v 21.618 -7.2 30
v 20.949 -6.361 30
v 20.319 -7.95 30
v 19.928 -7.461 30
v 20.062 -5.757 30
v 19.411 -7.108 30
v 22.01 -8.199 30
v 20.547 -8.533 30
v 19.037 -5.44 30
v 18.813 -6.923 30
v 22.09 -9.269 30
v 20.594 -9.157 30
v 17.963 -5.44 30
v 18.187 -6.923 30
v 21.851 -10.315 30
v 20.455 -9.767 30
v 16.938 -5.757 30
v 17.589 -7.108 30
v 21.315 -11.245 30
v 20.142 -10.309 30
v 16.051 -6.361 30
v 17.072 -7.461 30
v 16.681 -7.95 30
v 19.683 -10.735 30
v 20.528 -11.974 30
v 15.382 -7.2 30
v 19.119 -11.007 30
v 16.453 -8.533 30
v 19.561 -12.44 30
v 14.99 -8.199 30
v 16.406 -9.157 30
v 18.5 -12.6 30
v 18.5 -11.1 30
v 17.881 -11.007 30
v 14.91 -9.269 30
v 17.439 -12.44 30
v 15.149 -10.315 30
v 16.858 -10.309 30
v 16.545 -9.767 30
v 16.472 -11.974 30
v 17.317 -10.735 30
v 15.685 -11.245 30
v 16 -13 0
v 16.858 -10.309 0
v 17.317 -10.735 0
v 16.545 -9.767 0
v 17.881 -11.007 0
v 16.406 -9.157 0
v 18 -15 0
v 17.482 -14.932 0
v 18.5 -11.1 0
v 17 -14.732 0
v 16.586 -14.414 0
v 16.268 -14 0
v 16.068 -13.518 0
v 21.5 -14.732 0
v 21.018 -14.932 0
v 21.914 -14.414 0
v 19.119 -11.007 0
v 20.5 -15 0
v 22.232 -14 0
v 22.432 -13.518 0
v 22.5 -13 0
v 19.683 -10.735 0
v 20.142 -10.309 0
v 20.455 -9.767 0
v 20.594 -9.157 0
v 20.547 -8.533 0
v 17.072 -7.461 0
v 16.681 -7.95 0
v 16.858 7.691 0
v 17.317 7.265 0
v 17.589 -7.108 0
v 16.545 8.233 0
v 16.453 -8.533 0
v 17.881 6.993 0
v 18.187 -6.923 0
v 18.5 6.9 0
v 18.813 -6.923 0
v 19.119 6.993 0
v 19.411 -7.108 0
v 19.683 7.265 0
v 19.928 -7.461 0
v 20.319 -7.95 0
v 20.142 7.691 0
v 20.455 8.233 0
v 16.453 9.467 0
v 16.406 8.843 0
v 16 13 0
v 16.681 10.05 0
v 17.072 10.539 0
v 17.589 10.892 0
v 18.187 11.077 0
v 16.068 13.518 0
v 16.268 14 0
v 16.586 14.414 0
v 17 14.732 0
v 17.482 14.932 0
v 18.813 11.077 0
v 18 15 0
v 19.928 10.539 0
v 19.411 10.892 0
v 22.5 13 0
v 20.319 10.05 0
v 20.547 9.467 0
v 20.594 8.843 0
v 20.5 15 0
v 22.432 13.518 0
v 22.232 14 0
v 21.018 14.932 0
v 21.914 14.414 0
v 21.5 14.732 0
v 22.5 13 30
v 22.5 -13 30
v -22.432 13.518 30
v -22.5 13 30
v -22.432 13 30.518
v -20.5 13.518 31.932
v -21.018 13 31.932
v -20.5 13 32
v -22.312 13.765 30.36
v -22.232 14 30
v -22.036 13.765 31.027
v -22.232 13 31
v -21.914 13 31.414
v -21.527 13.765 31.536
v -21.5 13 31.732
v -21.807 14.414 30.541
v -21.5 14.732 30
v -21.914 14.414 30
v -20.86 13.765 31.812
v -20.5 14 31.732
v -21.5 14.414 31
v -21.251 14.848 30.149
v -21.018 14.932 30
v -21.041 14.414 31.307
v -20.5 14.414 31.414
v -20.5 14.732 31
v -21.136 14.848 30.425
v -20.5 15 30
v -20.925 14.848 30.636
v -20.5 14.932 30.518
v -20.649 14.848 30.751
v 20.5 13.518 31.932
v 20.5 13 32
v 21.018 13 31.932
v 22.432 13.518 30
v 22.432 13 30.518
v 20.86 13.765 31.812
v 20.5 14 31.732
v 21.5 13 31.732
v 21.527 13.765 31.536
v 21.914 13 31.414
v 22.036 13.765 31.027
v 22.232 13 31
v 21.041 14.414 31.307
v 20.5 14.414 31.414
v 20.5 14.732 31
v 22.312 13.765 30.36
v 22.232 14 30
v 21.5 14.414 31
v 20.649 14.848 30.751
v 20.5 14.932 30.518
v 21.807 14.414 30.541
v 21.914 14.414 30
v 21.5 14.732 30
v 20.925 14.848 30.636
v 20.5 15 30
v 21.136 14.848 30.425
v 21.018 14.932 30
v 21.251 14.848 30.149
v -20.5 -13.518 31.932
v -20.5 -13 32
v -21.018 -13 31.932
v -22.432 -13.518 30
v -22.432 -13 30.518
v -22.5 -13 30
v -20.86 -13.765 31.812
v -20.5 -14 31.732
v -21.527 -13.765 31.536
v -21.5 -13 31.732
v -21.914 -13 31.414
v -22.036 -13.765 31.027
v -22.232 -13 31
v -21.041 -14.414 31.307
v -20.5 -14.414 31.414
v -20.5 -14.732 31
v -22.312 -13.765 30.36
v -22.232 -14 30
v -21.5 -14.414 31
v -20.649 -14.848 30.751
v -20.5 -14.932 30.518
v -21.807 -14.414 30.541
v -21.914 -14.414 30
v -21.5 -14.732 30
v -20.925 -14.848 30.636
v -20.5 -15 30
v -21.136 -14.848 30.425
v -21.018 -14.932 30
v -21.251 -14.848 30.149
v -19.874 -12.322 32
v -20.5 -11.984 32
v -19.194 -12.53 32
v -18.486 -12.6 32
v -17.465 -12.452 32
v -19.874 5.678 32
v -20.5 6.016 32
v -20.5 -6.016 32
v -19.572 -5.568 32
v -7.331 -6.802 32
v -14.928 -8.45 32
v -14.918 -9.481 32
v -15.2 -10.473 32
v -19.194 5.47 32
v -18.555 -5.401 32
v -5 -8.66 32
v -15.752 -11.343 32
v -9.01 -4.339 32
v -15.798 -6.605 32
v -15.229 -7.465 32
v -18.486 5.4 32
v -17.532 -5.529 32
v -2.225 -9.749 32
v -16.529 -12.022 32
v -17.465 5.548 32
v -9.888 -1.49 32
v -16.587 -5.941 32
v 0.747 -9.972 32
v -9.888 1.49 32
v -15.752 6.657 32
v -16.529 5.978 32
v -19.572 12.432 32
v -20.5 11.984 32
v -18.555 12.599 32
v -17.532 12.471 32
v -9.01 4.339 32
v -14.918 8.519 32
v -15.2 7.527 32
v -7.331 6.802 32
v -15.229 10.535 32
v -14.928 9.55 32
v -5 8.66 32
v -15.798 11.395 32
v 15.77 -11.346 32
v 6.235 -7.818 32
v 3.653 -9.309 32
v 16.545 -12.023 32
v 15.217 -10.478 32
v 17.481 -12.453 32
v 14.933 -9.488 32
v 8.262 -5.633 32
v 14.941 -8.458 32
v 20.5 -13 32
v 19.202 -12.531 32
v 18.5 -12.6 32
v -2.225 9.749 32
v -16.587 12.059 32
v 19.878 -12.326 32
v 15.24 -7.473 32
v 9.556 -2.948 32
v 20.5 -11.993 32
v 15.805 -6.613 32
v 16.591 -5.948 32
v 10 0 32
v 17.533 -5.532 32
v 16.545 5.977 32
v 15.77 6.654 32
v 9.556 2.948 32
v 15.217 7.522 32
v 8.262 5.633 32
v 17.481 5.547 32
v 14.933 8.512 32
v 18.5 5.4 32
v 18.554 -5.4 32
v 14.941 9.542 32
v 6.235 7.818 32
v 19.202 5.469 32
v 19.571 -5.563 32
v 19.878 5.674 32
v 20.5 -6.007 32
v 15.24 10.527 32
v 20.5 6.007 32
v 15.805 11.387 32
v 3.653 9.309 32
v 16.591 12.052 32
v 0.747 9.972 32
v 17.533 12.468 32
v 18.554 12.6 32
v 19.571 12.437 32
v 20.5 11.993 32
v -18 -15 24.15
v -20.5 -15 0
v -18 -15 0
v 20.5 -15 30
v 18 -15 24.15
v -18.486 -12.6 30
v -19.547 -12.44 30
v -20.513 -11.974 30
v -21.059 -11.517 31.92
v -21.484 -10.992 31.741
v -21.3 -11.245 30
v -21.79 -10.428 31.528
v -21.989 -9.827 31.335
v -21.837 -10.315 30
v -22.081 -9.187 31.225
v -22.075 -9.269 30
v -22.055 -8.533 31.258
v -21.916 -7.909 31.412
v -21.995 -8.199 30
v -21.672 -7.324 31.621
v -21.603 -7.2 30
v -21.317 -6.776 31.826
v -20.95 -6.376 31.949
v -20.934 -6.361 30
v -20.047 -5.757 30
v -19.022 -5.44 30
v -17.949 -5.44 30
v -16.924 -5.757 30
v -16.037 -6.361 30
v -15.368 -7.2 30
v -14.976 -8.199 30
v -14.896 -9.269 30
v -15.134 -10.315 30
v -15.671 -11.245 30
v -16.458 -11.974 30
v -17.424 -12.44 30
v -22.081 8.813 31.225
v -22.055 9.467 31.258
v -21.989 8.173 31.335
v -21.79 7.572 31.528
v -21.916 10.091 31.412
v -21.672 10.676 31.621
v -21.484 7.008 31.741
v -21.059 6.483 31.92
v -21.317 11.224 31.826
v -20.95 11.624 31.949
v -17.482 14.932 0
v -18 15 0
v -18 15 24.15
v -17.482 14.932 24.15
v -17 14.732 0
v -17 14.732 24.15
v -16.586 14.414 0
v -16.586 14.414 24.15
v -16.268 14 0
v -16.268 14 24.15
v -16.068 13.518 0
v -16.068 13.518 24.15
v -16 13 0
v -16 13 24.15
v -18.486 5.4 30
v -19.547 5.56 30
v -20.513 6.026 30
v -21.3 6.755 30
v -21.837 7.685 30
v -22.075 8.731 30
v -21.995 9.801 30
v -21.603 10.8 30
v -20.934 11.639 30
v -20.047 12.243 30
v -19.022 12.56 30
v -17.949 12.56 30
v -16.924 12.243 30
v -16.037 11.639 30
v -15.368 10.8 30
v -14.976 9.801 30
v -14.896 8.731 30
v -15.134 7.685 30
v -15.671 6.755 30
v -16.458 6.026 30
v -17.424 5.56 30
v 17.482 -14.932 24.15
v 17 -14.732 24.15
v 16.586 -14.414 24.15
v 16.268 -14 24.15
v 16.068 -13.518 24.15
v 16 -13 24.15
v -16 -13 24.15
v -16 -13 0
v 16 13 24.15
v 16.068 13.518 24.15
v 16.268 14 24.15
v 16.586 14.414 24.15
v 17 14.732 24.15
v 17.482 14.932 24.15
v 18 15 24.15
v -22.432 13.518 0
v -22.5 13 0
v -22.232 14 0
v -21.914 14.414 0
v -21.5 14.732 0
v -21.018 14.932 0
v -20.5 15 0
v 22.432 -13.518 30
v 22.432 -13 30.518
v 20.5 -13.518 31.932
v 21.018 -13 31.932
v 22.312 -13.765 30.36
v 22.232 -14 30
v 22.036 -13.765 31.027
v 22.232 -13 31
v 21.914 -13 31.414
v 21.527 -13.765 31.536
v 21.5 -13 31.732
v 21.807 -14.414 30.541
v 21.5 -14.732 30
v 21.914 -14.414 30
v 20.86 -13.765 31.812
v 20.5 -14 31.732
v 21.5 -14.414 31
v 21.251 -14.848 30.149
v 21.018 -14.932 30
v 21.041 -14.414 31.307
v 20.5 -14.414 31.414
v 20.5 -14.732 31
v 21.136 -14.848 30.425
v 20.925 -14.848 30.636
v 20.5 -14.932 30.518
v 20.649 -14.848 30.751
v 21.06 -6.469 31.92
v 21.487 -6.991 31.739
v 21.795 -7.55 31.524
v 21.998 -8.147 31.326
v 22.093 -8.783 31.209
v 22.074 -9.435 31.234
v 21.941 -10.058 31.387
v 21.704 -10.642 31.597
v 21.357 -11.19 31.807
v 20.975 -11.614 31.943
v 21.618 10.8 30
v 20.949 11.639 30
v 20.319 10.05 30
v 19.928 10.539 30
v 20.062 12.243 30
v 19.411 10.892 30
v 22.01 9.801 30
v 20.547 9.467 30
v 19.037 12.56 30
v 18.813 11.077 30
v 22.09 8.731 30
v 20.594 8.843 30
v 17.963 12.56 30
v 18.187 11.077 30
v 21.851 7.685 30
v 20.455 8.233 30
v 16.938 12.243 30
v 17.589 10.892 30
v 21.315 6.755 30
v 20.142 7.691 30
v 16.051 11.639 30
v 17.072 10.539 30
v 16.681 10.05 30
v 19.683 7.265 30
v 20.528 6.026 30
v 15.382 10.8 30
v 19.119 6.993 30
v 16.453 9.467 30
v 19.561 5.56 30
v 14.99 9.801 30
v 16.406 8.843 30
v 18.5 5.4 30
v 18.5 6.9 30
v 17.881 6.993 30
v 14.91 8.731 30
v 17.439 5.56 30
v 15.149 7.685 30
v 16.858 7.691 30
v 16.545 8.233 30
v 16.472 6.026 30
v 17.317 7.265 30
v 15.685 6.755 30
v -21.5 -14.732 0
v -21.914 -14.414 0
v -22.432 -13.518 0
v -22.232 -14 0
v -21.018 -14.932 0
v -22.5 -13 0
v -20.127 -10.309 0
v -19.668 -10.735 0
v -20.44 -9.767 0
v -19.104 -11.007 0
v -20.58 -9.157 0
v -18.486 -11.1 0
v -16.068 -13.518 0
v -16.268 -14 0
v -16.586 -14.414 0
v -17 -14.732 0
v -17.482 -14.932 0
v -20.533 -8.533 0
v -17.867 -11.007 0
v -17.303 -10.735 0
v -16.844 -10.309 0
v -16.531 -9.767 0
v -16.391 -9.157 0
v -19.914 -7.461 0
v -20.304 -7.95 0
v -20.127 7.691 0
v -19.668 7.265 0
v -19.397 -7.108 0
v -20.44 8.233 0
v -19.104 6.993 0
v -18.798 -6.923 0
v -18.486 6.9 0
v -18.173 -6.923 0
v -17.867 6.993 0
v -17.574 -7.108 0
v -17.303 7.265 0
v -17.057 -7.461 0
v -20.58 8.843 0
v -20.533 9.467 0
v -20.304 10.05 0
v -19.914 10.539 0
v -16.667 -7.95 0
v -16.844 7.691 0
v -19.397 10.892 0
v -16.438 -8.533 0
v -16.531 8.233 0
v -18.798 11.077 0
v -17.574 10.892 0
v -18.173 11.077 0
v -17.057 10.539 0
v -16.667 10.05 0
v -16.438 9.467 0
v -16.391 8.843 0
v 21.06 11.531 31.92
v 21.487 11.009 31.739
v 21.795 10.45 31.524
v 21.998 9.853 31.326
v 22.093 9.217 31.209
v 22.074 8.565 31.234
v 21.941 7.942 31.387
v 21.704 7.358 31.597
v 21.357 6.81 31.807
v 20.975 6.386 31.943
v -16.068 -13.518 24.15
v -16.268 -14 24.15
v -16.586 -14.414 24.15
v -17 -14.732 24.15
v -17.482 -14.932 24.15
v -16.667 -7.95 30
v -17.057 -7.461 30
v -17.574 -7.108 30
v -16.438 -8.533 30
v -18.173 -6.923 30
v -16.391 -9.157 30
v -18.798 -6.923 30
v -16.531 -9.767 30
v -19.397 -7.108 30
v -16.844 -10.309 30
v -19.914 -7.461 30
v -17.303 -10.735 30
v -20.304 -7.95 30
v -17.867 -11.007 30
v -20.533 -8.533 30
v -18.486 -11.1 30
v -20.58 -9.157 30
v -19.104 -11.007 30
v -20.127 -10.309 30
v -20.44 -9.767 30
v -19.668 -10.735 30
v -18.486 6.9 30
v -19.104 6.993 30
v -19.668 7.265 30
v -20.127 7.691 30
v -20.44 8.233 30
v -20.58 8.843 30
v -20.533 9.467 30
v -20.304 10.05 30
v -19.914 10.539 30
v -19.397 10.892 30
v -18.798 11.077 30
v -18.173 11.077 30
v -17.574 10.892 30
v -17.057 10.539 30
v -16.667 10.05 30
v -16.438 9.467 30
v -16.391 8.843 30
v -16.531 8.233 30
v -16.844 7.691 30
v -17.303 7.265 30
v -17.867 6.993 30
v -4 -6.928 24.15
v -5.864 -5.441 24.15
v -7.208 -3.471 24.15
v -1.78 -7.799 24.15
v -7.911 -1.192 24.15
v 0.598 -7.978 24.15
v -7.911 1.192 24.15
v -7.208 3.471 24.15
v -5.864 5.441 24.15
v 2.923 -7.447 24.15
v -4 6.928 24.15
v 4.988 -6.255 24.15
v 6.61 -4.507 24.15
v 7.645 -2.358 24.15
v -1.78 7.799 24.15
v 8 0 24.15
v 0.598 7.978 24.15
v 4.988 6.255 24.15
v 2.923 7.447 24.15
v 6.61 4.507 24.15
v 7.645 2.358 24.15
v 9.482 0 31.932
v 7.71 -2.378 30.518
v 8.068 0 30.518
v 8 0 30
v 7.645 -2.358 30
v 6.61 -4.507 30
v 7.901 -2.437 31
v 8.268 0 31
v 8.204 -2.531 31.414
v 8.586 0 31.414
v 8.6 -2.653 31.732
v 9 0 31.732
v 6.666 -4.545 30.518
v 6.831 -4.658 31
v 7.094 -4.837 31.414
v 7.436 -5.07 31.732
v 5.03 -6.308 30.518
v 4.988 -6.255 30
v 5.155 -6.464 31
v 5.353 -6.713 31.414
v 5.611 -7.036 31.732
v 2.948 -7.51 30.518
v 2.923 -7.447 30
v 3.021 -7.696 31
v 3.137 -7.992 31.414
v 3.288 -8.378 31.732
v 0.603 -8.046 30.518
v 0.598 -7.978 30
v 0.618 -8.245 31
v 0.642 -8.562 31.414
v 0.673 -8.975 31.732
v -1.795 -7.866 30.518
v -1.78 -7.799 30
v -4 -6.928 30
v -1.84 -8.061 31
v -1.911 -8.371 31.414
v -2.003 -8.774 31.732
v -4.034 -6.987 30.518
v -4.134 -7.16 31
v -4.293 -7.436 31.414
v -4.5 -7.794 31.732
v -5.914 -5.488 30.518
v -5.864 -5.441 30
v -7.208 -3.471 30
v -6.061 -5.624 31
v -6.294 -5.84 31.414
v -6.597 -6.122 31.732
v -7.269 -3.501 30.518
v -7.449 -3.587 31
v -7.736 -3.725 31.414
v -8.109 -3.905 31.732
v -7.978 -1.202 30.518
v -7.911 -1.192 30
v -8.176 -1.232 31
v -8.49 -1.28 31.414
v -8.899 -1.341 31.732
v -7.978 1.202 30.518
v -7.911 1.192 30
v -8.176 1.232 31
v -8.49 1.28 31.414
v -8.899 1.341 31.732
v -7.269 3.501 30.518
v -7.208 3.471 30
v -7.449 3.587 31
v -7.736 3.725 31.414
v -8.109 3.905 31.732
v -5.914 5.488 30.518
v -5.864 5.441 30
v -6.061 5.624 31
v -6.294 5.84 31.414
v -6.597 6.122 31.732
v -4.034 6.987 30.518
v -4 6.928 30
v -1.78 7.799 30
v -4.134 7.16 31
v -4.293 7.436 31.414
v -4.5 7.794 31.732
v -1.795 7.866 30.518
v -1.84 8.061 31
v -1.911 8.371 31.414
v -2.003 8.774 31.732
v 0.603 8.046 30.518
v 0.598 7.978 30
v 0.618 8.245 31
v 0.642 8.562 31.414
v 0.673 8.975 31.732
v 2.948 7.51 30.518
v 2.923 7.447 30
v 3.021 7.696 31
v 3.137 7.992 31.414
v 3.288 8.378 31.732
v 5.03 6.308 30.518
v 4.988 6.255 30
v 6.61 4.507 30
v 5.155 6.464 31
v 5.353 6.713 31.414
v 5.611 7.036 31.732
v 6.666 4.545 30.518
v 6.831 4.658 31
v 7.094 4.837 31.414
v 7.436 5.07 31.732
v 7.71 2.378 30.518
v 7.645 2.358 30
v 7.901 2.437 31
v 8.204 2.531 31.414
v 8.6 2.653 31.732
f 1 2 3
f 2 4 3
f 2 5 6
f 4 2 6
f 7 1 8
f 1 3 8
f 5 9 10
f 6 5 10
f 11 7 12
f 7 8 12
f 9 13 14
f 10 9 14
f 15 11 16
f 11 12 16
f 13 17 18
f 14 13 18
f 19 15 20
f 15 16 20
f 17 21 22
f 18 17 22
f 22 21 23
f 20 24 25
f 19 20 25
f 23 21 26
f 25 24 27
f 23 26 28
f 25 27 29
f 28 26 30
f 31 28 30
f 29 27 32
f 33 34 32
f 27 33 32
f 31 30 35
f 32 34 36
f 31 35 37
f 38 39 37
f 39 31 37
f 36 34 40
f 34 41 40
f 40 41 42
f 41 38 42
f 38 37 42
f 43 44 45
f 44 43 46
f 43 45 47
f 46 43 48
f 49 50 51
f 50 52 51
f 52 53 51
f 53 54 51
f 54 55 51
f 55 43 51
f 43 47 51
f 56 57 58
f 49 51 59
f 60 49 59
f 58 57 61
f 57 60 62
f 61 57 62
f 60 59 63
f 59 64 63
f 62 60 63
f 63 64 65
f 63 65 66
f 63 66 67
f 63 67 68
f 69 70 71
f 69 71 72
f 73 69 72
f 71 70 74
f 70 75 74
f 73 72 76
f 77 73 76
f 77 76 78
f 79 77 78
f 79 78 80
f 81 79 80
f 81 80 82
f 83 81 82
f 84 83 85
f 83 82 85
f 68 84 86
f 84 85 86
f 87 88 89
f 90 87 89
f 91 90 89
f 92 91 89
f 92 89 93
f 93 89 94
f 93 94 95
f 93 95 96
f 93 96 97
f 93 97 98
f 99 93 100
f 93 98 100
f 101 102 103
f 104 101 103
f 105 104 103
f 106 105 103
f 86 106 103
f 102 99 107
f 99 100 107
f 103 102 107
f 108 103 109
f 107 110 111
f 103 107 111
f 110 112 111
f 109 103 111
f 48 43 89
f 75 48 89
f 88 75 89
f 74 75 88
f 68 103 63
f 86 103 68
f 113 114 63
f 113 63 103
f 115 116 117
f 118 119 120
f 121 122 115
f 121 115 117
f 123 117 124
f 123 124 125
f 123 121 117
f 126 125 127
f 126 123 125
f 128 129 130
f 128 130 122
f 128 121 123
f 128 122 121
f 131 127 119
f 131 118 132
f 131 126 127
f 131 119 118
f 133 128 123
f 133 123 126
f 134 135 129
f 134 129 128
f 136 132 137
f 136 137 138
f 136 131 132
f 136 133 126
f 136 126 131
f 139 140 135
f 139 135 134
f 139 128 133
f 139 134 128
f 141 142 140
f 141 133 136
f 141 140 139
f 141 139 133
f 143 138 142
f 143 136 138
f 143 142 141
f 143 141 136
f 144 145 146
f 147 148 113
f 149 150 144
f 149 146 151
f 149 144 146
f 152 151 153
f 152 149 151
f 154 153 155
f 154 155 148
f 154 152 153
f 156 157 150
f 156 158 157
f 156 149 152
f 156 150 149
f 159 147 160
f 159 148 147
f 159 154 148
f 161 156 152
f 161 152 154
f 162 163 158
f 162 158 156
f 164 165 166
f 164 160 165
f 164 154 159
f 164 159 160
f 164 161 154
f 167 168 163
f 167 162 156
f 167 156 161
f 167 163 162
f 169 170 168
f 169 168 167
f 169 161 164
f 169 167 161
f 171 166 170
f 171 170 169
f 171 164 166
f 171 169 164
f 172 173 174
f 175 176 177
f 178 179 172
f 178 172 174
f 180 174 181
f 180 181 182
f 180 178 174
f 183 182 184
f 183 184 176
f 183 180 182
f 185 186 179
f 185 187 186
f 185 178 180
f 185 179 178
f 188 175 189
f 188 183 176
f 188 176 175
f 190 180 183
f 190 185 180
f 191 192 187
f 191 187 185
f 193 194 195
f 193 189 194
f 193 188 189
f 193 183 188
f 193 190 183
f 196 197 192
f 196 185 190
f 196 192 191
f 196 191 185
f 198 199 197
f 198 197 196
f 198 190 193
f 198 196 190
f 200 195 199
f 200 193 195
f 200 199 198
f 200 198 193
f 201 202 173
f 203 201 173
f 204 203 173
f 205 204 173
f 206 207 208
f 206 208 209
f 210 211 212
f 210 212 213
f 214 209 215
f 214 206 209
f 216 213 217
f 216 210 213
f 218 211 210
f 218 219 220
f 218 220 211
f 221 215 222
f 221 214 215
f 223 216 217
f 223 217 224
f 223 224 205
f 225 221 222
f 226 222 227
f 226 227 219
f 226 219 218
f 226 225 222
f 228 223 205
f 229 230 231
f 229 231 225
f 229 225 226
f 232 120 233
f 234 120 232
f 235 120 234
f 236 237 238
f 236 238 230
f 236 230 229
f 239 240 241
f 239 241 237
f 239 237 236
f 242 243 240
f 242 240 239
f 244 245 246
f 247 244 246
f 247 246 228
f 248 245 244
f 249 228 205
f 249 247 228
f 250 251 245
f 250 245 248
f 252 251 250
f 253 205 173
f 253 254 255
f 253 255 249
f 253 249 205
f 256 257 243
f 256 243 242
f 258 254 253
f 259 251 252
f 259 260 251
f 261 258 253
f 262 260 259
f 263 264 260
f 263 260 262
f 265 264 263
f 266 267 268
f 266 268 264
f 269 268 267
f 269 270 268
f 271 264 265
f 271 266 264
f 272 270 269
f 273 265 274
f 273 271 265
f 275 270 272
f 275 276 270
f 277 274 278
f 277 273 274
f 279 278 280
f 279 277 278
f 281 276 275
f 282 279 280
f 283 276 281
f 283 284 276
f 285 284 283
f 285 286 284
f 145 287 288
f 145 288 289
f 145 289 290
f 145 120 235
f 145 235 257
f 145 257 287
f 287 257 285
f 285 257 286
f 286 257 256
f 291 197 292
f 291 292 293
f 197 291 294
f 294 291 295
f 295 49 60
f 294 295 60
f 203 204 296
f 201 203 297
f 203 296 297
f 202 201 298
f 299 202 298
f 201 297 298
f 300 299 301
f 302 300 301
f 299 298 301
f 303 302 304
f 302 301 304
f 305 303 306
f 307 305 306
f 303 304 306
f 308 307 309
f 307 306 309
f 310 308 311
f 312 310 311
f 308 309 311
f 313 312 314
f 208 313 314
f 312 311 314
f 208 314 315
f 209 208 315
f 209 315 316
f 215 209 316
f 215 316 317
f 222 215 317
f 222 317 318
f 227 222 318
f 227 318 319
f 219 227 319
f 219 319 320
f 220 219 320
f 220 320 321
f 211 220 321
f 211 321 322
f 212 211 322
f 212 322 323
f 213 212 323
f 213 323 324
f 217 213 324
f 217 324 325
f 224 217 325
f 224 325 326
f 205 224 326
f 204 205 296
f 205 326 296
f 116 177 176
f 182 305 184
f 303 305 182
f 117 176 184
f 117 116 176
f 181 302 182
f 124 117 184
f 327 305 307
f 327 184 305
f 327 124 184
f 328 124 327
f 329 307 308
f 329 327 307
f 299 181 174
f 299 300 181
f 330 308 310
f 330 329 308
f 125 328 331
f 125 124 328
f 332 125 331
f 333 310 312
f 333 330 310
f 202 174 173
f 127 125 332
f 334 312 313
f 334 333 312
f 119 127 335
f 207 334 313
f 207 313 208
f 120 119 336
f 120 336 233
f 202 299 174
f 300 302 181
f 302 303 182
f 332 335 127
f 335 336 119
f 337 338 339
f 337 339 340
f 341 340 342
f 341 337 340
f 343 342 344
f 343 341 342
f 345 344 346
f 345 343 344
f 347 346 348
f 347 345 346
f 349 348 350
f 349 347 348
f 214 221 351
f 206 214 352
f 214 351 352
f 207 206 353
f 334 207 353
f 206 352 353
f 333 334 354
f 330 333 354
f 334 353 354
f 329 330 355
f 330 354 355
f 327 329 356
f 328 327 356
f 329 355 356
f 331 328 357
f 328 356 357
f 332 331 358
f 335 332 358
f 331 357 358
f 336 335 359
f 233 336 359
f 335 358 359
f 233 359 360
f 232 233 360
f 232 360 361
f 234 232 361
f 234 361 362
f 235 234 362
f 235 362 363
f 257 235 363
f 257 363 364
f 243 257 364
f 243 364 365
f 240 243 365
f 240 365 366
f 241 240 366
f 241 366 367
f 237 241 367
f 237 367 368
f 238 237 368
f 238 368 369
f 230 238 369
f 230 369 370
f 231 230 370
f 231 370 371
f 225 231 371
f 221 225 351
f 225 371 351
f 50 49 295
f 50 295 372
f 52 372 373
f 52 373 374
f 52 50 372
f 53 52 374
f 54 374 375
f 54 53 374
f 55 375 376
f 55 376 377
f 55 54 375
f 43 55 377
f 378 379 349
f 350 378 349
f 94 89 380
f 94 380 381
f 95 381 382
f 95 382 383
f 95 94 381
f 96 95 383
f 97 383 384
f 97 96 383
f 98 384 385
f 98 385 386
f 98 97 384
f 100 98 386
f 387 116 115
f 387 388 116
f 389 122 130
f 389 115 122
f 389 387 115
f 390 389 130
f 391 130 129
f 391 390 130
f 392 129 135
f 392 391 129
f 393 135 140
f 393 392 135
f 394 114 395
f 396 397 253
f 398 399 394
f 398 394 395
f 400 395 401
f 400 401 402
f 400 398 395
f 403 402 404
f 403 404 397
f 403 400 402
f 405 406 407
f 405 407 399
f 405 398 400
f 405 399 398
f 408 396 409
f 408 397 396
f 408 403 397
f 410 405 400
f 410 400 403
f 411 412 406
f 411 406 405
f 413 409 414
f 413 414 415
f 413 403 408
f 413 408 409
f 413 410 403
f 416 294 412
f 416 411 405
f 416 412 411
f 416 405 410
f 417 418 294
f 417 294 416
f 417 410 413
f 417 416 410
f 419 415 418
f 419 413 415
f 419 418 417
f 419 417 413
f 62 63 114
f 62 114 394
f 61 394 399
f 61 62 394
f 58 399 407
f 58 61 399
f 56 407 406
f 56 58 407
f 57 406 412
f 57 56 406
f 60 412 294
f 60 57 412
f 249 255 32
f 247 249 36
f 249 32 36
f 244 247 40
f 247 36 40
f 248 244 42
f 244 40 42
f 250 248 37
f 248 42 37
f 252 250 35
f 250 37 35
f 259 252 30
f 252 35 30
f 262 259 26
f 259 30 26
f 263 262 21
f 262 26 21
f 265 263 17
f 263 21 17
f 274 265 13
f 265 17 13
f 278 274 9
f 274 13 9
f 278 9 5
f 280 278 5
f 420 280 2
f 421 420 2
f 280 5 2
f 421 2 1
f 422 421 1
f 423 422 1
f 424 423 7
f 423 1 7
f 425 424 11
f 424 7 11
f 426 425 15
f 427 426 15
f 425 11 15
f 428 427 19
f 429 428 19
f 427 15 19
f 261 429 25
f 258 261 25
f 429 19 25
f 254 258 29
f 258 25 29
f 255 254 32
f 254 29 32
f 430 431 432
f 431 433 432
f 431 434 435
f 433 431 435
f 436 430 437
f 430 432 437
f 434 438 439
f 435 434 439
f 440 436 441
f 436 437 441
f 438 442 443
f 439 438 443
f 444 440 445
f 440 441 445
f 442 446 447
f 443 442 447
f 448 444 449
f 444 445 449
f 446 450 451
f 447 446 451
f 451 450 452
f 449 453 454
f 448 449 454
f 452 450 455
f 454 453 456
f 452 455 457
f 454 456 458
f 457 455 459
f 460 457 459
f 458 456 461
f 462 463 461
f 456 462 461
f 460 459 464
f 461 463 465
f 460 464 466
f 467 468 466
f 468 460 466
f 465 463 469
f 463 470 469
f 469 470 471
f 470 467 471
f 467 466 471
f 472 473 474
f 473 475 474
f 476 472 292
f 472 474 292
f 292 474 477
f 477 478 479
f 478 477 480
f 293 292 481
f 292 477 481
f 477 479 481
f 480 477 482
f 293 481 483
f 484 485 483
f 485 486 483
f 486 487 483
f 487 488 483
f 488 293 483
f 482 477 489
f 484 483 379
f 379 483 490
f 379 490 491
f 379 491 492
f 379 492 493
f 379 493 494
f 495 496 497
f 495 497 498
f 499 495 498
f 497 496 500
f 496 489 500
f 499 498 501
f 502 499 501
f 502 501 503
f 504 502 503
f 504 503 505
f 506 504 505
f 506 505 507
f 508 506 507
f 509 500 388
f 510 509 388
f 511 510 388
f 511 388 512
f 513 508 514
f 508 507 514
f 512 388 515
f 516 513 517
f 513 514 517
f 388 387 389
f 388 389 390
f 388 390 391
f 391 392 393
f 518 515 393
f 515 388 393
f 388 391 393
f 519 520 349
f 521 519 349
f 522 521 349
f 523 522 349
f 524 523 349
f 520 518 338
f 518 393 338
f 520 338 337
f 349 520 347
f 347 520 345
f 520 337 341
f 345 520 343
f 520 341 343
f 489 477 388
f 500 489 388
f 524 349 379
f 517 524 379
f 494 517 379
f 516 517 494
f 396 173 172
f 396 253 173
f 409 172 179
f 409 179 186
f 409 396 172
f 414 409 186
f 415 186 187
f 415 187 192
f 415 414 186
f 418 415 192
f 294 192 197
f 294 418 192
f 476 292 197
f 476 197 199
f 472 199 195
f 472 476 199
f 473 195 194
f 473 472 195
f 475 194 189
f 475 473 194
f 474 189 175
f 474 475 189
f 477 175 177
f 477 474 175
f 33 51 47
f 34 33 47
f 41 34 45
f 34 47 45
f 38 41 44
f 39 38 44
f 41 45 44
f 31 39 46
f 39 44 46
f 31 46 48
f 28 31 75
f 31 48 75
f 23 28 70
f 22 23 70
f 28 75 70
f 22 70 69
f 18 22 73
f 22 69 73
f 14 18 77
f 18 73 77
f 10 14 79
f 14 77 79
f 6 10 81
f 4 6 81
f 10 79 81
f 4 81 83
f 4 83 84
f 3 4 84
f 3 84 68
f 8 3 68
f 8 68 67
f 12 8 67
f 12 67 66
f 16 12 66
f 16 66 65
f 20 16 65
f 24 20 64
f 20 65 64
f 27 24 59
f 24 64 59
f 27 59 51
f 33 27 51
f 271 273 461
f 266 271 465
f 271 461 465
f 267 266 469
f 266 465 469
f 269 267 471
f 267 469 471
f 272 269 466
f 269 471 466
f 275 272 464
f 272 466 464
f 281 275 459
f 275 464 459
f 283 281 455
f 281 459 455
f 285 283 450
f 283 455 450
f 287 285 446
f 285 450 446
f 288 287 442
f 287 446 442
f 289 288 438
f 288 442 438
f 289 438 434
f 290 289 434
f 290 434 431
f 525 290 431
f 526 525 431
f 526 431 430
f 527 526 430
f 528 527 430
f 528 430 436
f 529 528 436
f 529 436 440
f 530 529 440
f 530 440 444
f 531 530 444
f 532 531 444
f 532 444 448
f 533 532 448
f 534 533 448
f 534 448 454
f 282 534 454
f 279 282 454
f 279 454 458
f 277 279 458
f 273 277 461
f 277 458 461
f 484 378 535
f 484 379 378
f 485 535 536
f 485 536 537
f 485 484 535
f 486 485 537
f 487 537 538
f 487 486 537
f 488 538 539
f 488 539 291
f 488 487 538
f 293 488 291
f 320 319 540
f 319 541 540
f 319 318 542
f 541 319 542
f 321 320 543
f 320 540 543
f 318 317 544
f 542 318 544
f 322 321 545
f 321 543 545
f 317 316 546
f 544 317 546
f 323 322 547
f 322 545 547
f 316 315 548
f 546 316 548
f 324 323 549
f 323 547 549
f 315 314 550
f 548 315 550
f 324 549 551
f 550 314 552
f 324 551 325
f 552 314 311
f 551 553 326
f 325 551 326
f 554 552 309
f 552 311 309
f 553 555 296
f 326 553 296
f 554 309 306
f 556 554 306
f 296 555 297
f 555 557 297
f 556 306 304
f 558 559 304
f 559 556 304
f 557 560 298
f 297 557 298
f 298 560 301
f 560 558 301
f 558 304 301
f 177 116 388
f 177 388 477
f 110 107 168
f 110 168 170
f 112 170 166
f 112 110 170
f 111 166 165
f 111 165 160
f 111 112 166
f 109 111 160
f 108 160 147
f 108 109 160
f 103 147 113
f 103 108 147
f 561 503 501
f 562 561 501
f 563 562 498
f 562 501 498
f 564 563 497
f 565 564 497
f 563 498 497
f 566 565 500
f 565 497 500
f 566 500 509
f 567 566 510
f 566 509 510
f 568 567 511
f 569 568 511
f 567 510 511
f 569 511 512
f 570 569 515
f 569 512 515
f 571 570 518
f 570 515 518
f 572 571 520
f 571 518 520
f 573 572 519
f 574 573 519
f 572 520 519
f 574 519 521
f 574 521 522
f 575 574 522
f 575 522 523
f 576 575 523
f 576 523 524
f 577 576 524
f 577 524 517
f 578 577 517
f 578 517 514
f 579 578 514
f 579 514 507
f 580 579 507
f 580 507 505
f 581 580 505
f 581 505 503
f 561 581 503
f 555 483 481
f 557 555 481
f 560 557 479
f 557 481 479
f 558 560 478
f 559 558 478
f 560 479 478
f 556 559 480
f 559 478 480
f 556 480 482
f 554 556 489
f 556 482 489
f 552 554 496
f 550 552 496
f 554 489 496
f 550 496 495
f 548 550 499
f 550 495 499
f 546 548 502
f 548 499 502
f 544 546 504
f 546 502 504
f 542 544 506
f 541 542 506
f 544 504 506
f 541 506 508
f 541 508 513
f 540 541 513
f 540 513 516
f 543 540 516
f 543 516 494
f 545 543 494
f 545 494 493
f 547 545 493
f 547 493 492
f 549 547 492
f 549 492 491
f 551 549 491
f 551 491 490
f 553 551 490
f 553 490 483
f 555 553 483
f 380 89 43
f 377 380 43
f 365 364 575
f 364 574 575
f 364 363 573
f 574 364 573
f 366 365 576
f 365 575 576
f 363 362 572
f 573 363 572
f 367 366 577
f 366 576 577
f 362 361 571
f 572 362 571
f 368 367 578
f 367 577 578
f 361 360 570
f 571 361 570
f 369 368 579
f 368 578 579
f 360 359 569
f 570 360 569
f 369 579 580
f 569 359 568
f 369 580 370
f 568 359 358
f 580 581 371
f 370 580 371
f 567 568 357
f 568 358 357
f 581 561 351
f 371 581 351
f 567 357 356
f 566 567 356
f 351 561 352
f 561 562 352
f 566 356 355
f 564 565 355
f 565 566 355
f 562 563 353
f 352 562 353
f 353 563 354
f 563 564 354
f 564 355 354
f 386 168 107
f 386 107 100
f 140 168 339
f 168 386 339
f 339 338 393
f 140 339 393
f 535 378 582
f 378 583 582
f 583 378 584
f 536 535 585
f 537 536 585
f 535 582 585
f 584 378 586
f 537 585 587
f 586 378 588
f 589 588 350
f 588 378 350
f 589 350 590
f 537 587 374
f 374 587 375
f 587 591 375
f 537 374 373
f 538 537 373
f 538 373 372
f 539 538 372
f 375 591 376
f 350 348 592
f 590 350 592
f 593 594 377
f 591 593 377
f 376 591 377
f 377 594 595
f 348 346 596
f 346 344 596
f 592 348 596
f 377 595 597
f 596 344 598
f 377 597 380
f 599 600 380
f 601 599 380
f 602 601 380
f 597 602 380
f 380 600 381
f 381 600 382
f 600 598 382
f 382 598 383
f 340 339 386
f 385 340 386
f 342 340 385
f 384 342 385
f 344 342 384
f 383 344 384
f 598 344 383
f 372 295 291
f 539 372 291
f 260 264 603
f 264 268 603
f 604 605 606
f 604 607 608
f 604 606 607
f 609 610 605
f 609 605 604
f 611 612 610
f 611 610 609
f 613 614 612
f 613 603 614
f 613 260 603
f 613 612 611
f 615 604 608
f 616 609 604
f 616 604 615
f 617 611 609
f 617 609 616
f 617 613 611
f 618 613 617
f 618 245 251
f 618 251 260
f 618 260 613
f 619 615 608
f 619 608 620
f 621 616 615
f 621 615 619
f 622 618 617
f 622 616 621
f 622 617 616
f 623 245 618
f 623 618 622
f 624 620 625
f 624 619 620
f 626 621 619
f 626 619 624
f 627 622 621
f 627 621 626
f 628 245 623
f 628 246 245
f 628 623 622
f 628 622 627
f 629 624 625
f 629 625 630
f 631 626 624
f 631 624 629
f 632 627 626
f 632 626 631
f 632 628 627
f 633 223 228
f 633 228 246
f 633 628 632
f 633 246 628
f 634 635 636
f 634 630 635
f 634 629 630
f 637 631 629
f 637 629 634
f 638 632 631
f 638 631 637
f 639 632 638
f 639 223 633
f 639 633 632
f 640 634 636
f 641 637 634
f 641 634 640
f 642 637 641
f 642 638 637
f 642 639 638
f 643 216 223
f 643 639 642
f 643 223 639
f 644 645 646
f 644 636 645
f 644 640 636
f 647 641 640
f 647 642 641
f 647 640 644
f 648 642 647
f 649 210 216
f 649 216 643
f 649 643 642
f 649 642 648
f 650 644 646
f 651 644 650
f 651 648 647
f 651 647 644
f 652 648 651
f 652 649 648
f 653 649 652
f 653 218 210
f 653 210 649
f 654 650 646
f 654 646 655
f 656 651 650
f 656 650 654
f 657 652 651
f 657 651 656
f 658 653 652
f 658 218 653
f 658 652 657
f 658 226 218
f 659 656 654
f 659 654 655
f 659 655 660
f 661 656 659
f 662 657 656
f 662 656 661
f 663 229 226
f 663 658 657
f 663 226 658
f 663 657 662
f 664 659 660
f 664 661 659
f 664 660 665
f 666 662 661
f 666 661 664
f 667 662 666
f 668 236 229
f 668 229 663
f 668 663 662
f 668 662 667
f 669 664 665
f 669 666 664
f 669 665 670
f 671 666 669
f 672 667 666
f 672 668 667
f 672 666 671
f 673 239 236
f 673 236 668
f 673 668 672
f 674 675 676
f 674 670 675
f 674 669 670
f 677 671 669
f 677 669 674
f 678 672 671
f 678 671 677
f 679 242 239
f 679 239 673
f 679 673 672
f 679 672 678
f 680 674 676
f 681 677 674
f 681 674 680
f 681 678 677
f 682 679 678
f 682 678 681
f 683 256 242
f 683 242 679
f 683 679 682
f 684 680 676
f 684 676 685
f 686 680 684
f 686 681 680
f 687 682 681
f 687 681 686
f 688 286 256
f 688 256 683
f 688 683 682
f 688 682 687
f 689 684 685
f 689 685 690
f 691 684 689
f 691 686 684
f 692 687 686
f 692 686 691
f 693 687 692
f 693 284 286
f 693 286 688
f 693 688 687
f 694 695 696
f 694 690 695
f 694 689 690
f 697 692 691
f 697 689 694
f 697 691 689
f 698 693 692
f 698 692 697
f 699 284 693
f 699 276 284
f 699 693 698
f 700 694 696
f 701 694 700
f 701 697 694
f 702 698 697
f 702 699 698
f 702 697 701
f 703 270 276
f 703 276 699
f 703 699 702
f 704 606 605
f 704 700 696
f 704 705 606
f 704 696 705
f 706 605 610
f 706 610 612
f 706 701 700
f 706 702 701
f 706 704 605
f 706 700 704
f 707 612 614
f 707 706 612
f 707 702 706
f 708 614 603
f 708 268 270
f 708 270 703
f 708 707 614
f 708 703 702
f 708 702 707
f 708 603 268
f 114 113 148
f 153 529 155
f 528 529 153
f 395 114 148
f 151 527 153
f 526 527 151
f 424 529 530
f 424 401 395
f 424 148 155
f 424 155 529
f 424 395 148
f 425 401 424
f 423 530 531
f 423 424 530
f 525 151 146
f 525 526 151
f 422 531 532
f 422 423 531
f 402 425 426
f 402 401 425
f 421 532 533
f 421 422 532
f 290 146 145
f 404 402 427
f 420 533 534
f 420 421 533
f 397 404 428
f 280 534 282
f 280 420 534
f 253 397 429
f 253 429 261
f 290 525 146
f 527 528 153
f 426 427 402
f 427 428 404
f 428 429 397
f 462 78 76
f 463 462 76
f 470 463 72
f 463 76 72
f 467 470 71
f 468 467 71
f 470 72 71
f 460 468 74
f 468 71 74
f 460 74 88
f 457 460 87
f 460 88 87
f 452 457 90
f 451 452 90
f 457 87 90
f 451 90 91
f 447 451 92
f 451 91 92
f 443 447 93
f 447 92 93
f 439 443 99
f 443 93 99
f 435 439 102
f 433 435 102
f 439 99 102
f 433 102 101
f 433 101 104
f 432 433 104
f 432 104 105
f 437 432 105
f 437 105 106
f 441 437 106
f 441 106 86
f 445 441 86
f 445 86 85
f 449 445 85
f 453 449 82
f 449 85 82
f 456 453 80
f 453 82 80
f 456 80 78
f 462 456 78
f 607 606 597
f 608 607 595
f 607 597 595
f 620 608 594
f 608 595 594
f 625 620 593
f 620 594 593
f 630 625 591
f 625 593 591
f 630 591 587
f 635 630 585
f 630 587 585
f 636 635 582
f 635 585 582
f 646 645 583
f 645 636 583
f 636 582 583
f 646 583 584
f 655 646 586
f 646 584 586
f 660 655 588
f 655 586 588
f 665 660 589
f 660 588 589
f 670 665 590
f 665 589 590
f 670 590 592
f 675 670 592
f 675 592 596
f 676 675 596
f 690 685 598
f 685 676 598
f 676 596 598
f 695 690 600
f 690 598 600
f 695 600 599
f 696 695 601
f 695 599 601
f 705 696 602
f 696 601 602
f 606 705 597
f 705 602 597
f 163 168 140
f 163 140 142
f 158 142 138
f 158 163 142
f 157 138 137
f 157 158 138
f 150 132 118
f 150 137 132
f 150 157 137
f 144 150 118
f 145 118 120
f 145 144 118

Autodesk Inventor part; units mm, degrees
ref_plane "YZ Plane" through (0, 0, 0) normal (1, 0, 0) x (0, 1, 0)
ref_plane "XZ Plane" through (0, 0, 0) normal (0, 1, 0) x (-1, 0, 0)
sketch "Skizze1" plane through (0, 0, 0) normal (0, 0, 1) x (1, 0, 0)
  circle A0 centre (0, 0) radius 8 construction
  line L0 (-30, -17.5) -> (30, -17.5) construction
  line L1 (30, -17.5) -> (30, 17.5) construction
  line L2 (30, 17.5) -> (-30, 17.5) construction
  line L3 (-30, 17.5) -> (-30, -17.5) construction
  circle A1 centre (0, 0) radius 9 construction
  circle A2 centre (0, 0) radius 14 construction
  line L4 (-15, -15) -> (15, -15)
  line L5 (15, 15) -> (-15, 15)
  line L6 (-15, -15) -> (15, 15) construction
  line L7 (15, -15) -> (-15, 15) construction
  line L8 (-22.5, -15) -> (22.5, -15)
  line L9 (22.5, -15) -> (22.5, 15)
  line L10 (22.5, 15) -> (-22.5, 15)
  line L11 (-22.5, 15) -> (-22.5, -15)
  line L12 (-22.5, -15) -> (22.5, 15) construction
  line L13 (22.5, -15) -> (-22.5, 15) construction
  circle A3 centre (0, 0) radius 8
  point P0 (0, 0)
extrude "Extrusion1" add sketch "Skizze1" along normal blind 32
ref_plane "Arbeitsebene1" through (0, 0, 0) normal (0, 0, 1) x (1, 0, 0)
sketch "Skizze2" plane through (0, 0, 0) normal (0, 0, 1) x (1, 0, 0)
  circle A0 centre (0, 0) radius 13.8 construction
  circle A1 centre (0, 0) radius 14 construction
  line L0 (22.5, 15) -> (-22.5, 15) construction
  line L1 (22.5, -15) -> (22.5, 15) construction
  line L2 (-22.5, -15) -> (22.5, -15) construction
  line L3 (-22.5, 15) -> (-22.5, -15) construction
  line L4 (-22.5, -15) -> (22.5, -15) projected
  line L5 (-16, 15) -> (16, 15)
  line L6 (16, 15) -> (16, -15)
  line L7 (16, -15) -> (-16, -15)
  line L8 (-16, -15) -> (-16, 15)
  line L9 (-16, 15) -> (16, -15) construction
  line L10 (16, 15) -> (-16, -15) construction
  point P0 (0, 0)
  dimension "d5" = 32
ref_plane "Arbeitsebene2" through (-7.2804, -7.2804, 24.15) normal (0, 0, -1) x (-0.0257355, 0.9996688, 0)
extrude "Extrusion2" cut sketch "Skizze2" along normal up to surface (24.15 mm away)
sketch "Skizze3" plane through (0, 0, 32) normal (0, 0, 1) x (1, 0, 0)
  circle A0 centre (0, 0) radius 8 construction
  line L0 (-22.5, -15) -> (22.5, -15) construction
  line L1 (22.5, -15) -> (22.5, 15) construction
  line L2 (22.5, 15) -> (-22.5, 15) construction
  line L3 (-22.5, 15) -> (-22.5, -15) construction
  line L4 (16, -15) -> (16, 15) construction
  line L5 (-16, 15) -> (-16, -15) construction
  line L6 (22.5, -11.8361) -> (18.5, -11.8361) construction
  line L7 (16, -15) -> (22.5, -15) construction
  line L8 (18.5, -15) -> (18.5, -9) construction
  line L9 (22.5, 15) -> (-22.5, 15) construction
  line L10 (18.5, 15) -> (18.5, 9) construction
  line L11 (-22.5, 15) -> (-22.5, -15) construction
  line L12 (-22.5, -9) -> (-18.4855, -9) construction
  line L13 (-22.5, 9) -> (-18.4855, 9) construction
  point P0 (0, 0)
  dimension "d9" = 4
  dimension "d10" = 6
  dimension "d11" = 6
hole "Bohrung1" at (18.5, -9, 32) at (18.5, 9, 32) at (-18.4855, -9, 32) at (-18.4855, 9, 32) direction (0, 0, -1) diameter 4.2 end through all counterbore diameter 7.2 counterbore depth 2
fillet "Rundung1" radius 2 4 edges at (0, -15, 32) (22.5, 0, 32) (0, 15, 32) (-22.5, 0, 32)
fillet "Rundung2" radius 2 1 edges at (-8, 0, 32)
fillet "Rundung3" radius 2 12 edges at (21.9142, 14.4142, 31.4142) (22.5, 15, 15) (16, 15, 12.075) (-16, 15, 12.075) (-21.9142, 14.4142, 31.4142) (-22.5, 15, 15) (21.9142, -14.4142, 31.4142) (22.5, -15, 15) (-21.9142, -14.4142, 31.4142) (-22.5, -15, 15) (-16, -15, 12.075) (16, -15, 12.075)
properties part number "Upper_bearing_support_outside"
